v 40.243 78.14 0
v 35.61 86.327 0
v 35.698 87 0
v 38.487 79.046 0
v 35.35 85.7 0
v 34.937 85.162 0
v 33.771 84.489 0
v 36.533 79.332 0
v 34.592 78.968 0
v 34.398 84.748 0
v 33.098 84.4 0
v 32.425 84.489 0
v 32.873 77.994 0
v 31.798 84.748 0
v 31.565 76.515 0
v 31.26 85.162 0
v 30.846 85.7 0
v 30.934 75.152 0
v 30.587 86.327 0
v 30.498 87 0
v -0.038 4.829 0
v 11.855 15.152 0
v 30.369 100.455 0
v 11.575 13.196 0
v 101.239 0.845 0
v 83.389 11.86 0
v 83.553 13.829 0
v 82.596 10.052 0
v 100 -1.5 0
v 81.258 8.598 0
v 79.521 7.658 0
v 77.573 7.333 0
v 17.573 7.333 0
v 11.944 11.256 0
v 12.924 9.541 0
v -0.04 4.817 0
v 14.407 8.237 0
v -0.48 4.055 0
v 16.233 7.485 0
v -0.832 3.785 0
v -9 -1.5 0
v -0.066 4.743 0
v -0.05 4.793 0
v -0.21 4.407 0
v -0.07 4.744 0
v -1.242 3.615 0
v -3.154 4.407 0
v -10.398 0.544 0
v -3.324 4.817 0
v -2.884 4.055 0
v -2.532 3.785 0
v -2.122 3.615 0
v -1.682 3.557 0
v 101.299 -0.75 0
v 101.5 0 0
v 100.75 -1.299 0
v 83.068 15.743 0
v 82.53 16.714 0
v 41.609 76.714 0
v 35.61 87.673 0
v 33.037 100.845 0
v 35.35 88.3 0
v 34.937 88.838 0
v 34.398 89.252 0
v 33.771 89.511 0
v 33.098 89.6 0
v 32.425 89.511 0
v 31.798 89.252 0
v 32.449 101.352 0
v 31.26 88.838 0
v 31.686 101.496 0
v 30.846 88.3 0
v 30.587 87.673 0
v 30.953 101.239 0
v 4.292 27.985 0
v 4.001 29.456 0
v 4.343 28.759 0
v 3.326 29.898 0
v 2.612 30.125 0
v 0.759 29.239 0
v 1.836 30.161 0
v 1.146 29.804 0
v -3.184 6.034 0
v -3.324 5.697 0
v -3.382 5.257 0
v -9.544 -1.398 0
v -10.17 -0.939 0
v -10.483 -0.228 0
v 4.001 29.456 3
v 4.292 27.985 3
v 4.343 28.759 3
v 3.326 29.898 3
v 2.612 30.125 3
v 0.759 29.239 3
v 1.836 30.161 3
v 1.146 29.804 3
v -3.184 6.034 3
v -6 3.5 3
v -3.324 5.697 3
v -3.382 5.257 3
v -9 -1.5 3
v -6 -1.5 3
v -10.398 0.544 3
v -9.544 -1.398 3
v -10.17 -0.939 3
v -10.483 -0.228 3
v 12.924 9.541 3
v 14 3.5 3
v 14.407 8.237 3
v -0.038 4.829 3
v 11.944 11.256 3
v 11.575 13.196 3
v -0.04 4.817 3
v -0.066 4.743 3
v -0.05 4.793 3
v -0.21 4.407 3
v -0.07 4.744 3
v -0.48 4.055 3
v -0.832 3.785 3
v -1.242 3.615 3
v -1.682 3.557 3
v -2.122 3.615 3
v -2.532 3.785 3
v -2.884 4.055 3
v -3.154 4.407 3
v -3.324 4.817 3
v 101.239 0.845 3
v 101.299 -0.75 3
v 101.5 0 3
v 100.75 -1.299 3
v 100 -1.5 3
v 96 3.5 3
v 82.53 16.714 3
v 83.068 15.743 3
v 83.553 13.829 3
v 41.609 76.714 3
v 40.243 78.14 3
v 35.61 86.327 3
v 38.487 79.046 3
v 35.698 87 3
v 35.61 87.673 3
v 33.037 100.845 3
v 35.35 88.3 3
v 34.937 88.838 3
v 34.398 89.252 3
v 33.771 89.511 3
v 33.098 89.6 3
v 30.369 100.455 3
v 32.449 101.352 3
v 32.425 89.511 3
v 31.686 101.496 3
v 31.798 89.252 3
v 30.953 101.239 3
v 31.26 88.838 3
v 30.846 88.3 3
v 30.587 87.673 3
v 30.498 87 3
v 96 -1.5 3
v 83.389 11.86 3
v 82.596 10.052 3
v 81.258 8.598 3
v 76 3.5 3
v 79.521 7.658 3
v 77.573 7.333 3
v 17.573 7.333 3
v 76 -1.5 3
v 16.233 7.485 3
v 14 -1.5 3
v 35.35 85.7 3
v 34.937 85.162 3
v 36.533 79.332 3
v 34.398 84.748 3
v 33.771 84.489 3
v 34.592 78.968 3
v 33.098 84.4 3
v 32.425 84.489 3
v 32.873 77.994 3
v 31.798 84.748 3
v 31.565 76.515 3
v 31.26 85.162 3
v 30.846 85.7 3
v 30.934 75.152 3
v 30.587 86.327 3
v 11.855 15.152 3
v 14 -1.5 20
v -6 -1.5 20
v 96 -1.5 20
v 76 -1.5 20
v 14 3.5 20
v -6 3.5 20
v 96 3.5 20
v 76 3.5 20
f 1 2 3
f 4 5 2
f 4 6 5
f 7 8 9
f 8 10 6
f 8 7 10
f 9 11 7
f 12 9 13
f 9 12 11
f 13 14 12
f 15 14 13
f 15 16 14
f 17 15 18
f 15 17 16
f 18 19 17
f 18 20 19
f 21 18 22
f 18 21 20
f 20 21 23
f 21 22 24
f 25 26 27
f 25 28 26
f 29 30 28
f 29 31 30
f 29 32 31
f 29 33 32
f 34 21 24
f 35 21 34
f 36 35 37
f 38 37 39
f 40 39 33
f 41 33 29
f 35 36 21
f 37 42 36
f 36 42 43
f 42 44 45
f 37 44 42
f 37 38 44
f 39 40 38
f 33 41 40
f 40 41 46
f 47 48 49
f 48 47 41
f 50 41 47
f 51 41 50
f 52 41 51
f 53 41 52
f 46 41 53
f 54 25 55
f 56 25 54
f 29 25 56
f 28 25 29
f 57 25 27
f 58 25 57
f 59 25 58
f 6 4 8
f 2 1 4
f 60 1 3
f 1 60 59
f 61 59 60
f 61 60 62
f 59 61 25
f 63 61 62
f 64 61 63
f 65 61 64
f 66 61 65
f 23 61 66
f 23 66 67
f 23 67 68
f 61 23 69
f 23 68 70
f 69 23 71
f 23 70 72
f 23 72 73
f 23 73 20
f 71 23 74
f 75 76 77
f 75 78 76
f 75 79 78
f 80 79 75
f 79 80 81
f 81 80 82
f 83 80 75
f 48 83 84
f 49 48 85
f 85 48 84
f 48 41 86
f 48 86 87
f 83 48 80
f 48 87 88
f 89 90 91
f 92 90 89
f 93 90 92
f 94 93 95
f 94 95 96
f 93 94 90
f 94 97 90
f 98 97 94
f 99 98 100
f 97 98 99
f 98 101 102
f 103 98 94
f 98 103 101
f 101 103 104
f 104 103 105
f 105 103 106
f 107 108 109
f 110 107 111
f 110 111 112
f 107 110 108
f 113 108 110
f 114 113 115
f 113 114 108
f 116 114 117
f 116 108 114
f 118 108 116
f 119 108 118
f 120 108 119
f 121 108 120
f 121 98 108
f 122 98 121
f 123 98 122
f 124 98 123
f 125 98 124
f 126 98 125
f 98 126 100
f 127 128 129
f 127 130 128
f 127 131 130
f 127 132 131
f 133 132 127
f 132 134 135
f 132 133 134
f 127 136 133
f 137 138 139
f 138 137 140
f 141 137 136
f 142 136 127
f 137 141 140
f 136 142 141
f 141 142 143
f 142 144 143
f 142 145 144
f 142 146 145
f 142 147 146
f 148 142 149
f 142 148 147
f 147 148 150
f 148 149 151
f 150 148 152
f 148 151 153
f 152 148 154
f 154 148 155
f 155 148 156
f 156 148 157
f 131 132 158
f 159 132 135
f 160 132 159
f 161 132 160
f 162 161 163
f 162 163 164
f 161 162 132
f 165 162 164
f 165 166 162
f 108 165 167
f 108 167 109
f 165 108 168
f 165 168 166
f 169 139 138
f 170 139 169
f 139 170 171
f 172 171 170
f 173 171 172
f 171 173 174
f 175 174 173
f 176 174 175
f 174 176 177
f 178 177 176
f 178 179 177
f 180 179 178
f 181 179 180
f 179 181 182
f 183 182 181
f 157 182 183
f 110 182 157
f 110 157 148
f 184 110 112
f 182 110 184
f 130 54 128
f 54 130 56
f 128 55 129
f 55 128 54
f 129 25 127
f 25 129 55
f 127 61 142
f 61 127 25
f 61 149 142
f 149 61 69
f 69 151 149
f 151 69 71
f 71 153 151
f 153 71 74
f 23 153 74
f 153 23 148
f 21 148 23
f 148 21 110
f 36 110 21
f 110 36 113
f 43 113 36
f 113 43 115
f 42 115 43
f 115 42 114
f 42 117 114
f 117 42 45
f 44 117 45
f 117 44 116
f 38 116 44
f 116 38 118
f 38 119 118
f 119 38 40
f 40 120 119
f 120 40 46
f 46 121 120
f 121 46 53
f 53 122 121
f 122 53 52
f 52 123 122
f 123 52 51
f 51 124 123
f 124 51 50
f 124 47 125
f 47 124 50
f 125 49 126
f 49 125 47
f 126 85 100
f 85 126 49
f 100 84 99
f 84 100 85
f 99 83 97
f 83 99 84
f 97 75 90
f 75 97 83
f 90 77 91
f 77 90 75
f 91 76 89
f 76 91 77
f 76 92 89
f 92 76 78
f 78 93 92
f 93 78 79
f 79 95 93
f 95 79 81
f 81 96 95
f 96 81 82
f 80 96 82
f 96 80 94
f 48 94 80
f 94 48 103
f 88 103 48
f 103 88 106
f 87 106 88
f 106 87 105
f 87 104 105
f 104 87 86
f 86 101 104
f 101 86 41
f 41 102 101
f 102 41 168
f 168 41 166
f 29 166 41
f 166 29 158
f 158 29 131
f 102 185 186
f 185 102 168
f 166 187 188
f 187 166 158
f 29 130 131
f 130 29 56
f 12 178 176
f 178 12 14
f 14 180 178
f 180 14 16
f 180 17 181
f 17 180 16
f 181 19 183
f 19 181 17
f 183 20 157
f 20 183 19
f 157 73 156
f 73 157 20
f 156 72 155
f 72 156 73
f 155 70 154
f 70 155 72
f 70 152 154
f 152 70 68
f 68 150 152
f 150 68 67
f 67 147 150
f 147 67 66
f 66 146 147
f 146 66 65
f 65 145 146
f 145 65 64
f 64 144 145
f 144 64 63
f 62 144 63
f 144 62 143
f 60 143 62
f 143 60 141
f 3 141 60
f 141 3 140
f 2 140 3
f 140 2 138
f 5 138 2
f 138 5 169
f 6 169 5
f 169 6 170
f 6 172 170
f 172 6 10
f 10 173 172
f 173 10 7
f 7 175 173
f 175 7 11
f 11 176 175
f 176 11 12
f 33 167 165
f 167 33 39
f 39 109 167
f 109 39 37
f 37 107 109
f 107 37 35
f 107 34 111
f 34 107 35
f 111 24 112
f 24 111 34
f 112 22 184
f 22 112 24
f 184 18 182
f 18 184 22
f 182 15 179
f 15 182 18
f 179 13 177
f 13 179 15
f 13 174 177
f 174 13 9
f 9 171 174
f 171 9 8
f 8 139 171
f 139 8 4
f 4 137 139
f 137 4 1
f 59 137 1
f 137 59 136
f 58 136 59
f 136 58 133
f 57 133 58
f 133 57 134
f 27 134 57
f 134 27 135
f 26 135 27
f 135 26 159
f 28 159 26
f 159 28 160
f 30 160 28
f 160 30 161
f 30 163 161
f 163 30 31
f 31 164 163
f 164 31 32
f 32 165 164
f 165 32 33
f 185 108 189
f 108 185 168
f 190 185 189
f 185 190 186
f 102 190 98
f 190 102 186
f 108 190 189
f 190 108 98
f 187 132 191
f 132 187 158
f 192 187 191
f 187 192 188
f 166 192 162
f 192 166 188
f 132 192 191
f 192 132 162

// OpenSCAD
// clamps for various purposes
//
//
// Background:
//   - Greenhouse clamp - Weinranken am Gewaechshaus befestigen
//   - CAD manual: http://www.openscad.org/documentation.html
//
// Andreas Merz 2020-04-19, v0.3 
// GPLv3 or later, see http://www.gnu.org/licenses


//---------------- Primitives ---------------------

// Werkzeuge, um Fasen mit minkowski() herzustellen

module pyramid(h=1) {
    linear_extrude(height=h, scale=0) rotate([0,0,45]) square(sqrt(2)*h,center=true);
}

module octaeder(r=0.3) {
  union() {
    pyramid(h=r);
    rotate([180,0,0]) pyramid(h=r);
  }
}

module clampshape1half(s1=3.7, y1=17.5) {
             // y1        // clamp length
             // s1        // clamp width at bottom
             c=0.3;       // clearance / spiel in mm
             w=2;         // wall thickness
             b=w*3/2;     // bottom thickness
             m=0.3;       // reduce shape for minkowski()
             s2=(s1+c)/2;     // width at bottom
             translate([0,b])
               polygon(points=[
                [0,0-m],[s2-0.3+m,0-m],[s2-0.1+m,0.1-m],[s2+m,0.3-m],[s2+0.1+m,0.5-m],[s2+m+0.1,1-m],[s2+m,1.5-m],
                [s1/2-c-0.1+m,3.5],[s2+m,5], 
                [min(0.35,s1/2-1+0.05)+m,y1-3],[min(0.3,s1/2-1)+m,y1-2.5],[min(0.3,s1/2)+0.2+m,y1-2.1],
                [(s1+1)/2+m/2,y1-m],                   // outer contour starts here
                [min(0.3,s1/2-1)+w-0.9-m,y1-2.8],
                [s2+w-m-c,5],
                [1+s2+w-m,0],
                [1+s2+w-m,-b+m],
                [0,-b+m]]);
}


//-------------------------------
// dovetail
//
//       w2
//    ---------
//    \       /  h
//     ---+---
//       w1
//-------------------------------

module schwalbenschwanz(h=2, w1=4, w2=6) {
             //w1=(w2-h*tan(30));      // Flankenwinkel 30 deg
             c=0.13;   // clearance / spiel in mm
             polygon(points=[[-w1/2+c,0],[w1/2-c,0],[w2/2-c,h],[-w2/2+c,h]]);
}

module schwalbenschwanz_hollow(h=2, w1=4, w2=6, w3=0.9) {
        // w3      // wall thickness
        c=0.13;   // clearance / spiel in mm
        difference() {
             schwalbenschwanz(h=h, w1=w1, w2=w2);
             schwalbenschwanz(h=h-w3+c, w1=w1-2*w3, w2=(w2-w1)/2*(h-w3+c)/h + w1-w3-2*c);
        }  
}

module dovetail3D(h=20, s=45, t=0.8) {
         c=0.3;   // clearance / spiel in mm
         difference() { 
           linear_extrude(height=h)
              union() {
                schwalbenschwanz_hollow();
                translate([-2+c,-t]) square([4-2*c,t]);

              }
           union() {
             rotate([s,0,0]) translate([-4,0,-4]) cube([8, 4, 4]);
             //translate([0,0,(h+1)/2]) cube([1.6+c, 2.2+c, 4*h+2], center=true);
           }
         }
 }


//---------------- Clamps ---------------------

module clampshape1(clampwidth=3.7, clamplength=17.5, cz=20) {
     w=2;
     union() {
       minkowski() {
         linear_extrude(height=cz)
           union() {
             mirror() 
             clampshape1half(s1=clampwidth, y1=clamplength);
             clampshape1half(s1=clampwidth, y1=clamplength);
           }
          octaeder();
       } 
       //translate([0,-w,cz/2]) rotate([90,90,0]) linear_extrude(height=0.2) text(str(clampwidth), size = fontsize, font = fontname, halign = "center", valign = "center", $fn = 32);
     }
}

module clampshape2(clampwidth=3.7, clamplength=17.5, cz=20) {
     w=2;
     fontsize = 4;
     //fontname = "Liberation Sans";
     fontname = "FreeSans:Bold";
     union() {
       clampshape1(clampwidth=clampwidth, clamplength=clamplength, cz=cz);
       translate([0,0,cz/2]) rotate([90,90,0]) linear_extrude(height=0.3) text(str(clampwidth), size = fontsize, font = fontname, halign = "center", valign = "center", $fn = 32);
     }
}

module clampshape3(clampwidth=3.7, clamplength=17.5, cz=20) {
     w=2;
     m=0.3;
     union() {
         clampshape2(clampwidth=clampwidth, clamplength=clamplength, cz=cz);
         translate([0,0,  cz/4-m]) rotate(180) rotate([0,180]) dovetail3D(h=cz/4, s=45, t=m);
         translate([0,0,3*cz/4+m]) rotate(180) rotate([0,  0]) dovetail3D(h=cz/4, s=45, t=m);
     }       
}

module clampshape4(clampwidth=3.7, clamplength=17.5, cz=20) {
     w=2;
     m=0.3;
     wl=1.2;   // wall thickness of attachment loops
     fontsize = 4;
     //fontname = "Liberation Sans";
     fontname = "FreeSans:Bold";
     union() {
         clampshape1(clampwidth=clampwidth, clamplength=clamplength, cz=cz);
         translate([0,-w -(4-2*wl)/2,  cz/2]) 
           difference() {
           cube([6.5,    4,    cz+2*m],   center=true);
           union() {
             cube([6.5-2*wl, 4-2*wl, cz+2*m+2], center=true);
             cube([6.5+2,    4-2*wl, cz/2], center=true);
           }
         }
         // add text
         translate([0,-w-(4-wl),cz/2]) rotate([90,90,0]) linear_extrude(height=0.3) text(str(clampwidth), size = fontsize, font = fontname, halign = "center", valign = "center", $fn = 32);
     }       
}

//---------------- Book stand, Standfuss fuer Leitz-Order ---------------------

module pedestalshape2D(
     clampwidth=3.4, 
     clamplength=25,
     bookheight=330,    // needed to calculate the angle to keep center of gravity
     xp=100,           // length of pedestal foot
     yp=100,           // heigth of pedestal
     yw=3              // bottom thickness
     ) {
     scale=0.6;
     cr=1.5;             // chamfer / radius
     y=sqrt(bookheight*bookheight -xp*xp);
     x1=xp*yp/y;
     p1=[0,0];
     p2=[xp,0];    // left point
     p3=[x1,yp];   // top point

     mr=[[0,-1],[1,0]];
     v13 = p3-p1;
     e13 = v13/norm(v13); // unit direction vector of book contact side
     n13 = mr*e13;        // normal vector of book contact side
     p4= p1+yw*e13;
     p5= p4 + n13*(clampwidth+2*cr);
     p6= p5 + e13*clamplength-0.15*n13*clampwidth;  // slight cone
     p7= p6 + n13*cr/2;
     t = -p6[2]/n13[2];
     p8= p1 +[-9,0];
     pcenter=(p1+p2+p3)/3;
     difference() {
       offset(r=cr,$fn=12) polygon(points=[ p1,p2,p3,p4,p5,p6,p7,p8 ]*1.0);
       union() {
         translate(pcenter*((1-scale))) offset(r=6) polygon(points=[ p1,p2,p3 ]*scale );
         // dirty: radius at the notch bottom
	 translate(p4+ 0.94*clampwidth*n13 + cr*e13) circle(d=clampwidth, $fn=24);
	 // dirty: hole at the top
	 translate(p3-0.13*yp*[-0.1,1]) circle(d=5.2, $fn=24);
       }
     }       
}

// Book stand, Musical Stand, Notenstaender
module pedestalA(
     xp=100,           // length of pedestal foot
     z=3               // z thickness
     ) {
     // dirty: will not fit anymore, if parameters of pedestalshape2D are changed
     union() {
       linear_extrude(height=z) pedestalshape2D(xp=xp);
       translate([   -6,-1.5,0])  cube([20,5,20], center=false);
       translate([ xp-24,-1.5,0])  cube([20,5,20], center=false);
     }
}



//---------------- Weidenzweige arrangieren ---------------------
// https://www.thingiverse.com/thing:4432806
// this is a fixture to arrange 12 or 24 cut branches of a
// willow tree to form a hyperboloidal structure
// Ideally, two instances are used to yield a well-defined geometry.
//
// of course, it may also be used to create a magnetic loop antenna;
// if n is choosen to be odd.  :-)

// default globals
wz_n=24;    // number of segments
wz_w=4;     // width of structures
wz_s=16;    // space between rims
wz_c=0.4;   // clearance
wz_r1=50;   // nominal inner diameter

module hyperboloid(r1=wz_r1+wz_s/2, h1=50) {
  w=2;
  phioff=5;
  slant=45;
  for(ii=[0:15:360])
     rotate([0,0,ii+phioff])
       translate([r1,0,0]) rotate([slant,0,0]) rotate([0,0,22.5])
         cylinder(r=w/2, h=h1/cos(slant),center=true, $fn=16);
}

module starwheel1(r1=wz_r1) {
  // Nachteil: muss zerstoert werden beim Entfernen.
  n=wz_n;
  w=wz_w;
  s=wz_s;
  c=wz_c;   // clearance
  linear_extrude(height=w)
  union() {
    difference() {
      for(ii=[0:360/n:360]) {
	 rotate([0,0,ii])
	   union() {
             //translate([0,0,0]) polygon(points=[ [0,0],[r1+w+s,-w],[r1+w+s,+w]]);
	     translate([r1,0,0])square([s,w-c/2]);
	     circle(r=r1+w, $fn=4*n);
	   }
      }
      circle(r=r1+c/2, $fn=4*n);
    }
    // outer rim
    difference() {
      circle(r=r1+s+w*1.0, $fn=4*n);
      circle(r=r1+s -c/2,  $fn=4*n);
    }
  }
}

module starwheel2(r1=wz_r1) {
  n=wz_n;
  w=wz_w;
  s=wz_s;
  c=wz_c;   // clearance
  difference() {
    // star
    linear_extrude(height=w)
    difference() {
      for(ii=[0:360/n:360]) {
	 rotate([0,0,ii])
	   union() {
	     translate([r1,0,0]) square([s+1.5*w,w-c]);
	     circle(r=r1+w, $fn=4*n);
	   }
      }
      circle(r=r1, $fn=4*n);
    }
    // outer rim gaps
    translate([0,0,w/2])
      linear_extrude(height=w)
	difference() {
	  circle(r=r1+s+w+c/2, $fn=4*n);
	  circle(r=r1+s-c/2,   $fn=4*n);
	}
  
  }
}


module starwheel3(r1=wz_r1) {    // outer rim to click into starwheel2
  n=wz_n;
  w=wz_w;
  s=wz_s;
  c=wz_c;   // clearance
  rotate([0,0,0.75*180/n])
  difference() {
    // outer rim
    translate([0,0,0])
      linear_extrude(height=w)
	difference() {
	  circle(r=r1+s+w-c/2, $fn=4*n);
	  circle(r=r1+s  +c/2, $fn=4*n);
	}
    // star gaps
    translate([0,0,w/2])
      linear_extrude(height=w)
	for(ii=[0:360/n:360]) {
	   rotate([0,0,ii])
	     union() {
	       translate([r1,0,0]) square([s+1.5*w,w+c]);
	       circle(r=r1+w, $fn=4*n);
	     }
	}
  }
}


module starwheel4(r1=wz_r1) {     // outer rim segments to click into starwheel2
  n=wz_n;
  w=wz_w;
  s=wz_s;
  c=wz_c;   // clearance
  difference() {
    translate([0,0,0]) starwheel3();
    union() {
      rotate([0,0, asin(2/2*w/(r1+w+s))]) translate([0,0,-0.1])         cube([(r1+w+s), r1+w+s, w+0.2]);
      rotate([0,0,-asin(2/2*w/(r1+w+s))]) translate([-(r1+w+s),0,-0.1]) cube([(r1+w+s), r1+w+s, w+0.2]);
      // Endverschluss rechts
      rotate([0,0,-asin(1/2*w/(r1+w+s))]) translate([(r1+s+w/2)/2,0,0]) cube([(r1+s+w/2), w+c,   w+0.2], center=true);
      rotate([0,0,-asin(1/2*w/(r1+w+s))]) translate([(r1+s+w/2)/2,0,w]) cube([(r1+s+w*2), w+c,   w+0.2], center=true);
      rotate([0,0, asin(1/2*w/(r1+w+s))]) translate([(r1+s+w/2)/2,0,w]) cube([(r1+s+w/2), w+c,   w+0.2], center=true);
      // Endverschluss links
      rotate([0,0, asin(1/2*w/(r1+w+s))]) translate([-3*(r1+s+w/2)/2,0,w]) cube([(r1+s+w/2), w+c, w+0.2], center=true);
      rotate([0,0, asin(1/2*w/(r1+w+s))]) translate([-3*(r1+s+w/2)/2,0,0]) cube([(r1+s+w*2), w+c, w+0.2], center=true);
      rotate([0,0,-asin(1/2*w/(r1+w+s))]) translate([-3*(r1+s+w/2)/2,0,0]) cube([(r1+s+w/2), w+c, w+0.2], center=true);
    }
  }  
}

//---------------- Instances ---------------------

//clampshape3();

//schwalbenschwanz_hollow(h=2);

//translate([0,0,20]) hyperboloid();
//starwheel2();
//starwheel4();

pedestalA();
